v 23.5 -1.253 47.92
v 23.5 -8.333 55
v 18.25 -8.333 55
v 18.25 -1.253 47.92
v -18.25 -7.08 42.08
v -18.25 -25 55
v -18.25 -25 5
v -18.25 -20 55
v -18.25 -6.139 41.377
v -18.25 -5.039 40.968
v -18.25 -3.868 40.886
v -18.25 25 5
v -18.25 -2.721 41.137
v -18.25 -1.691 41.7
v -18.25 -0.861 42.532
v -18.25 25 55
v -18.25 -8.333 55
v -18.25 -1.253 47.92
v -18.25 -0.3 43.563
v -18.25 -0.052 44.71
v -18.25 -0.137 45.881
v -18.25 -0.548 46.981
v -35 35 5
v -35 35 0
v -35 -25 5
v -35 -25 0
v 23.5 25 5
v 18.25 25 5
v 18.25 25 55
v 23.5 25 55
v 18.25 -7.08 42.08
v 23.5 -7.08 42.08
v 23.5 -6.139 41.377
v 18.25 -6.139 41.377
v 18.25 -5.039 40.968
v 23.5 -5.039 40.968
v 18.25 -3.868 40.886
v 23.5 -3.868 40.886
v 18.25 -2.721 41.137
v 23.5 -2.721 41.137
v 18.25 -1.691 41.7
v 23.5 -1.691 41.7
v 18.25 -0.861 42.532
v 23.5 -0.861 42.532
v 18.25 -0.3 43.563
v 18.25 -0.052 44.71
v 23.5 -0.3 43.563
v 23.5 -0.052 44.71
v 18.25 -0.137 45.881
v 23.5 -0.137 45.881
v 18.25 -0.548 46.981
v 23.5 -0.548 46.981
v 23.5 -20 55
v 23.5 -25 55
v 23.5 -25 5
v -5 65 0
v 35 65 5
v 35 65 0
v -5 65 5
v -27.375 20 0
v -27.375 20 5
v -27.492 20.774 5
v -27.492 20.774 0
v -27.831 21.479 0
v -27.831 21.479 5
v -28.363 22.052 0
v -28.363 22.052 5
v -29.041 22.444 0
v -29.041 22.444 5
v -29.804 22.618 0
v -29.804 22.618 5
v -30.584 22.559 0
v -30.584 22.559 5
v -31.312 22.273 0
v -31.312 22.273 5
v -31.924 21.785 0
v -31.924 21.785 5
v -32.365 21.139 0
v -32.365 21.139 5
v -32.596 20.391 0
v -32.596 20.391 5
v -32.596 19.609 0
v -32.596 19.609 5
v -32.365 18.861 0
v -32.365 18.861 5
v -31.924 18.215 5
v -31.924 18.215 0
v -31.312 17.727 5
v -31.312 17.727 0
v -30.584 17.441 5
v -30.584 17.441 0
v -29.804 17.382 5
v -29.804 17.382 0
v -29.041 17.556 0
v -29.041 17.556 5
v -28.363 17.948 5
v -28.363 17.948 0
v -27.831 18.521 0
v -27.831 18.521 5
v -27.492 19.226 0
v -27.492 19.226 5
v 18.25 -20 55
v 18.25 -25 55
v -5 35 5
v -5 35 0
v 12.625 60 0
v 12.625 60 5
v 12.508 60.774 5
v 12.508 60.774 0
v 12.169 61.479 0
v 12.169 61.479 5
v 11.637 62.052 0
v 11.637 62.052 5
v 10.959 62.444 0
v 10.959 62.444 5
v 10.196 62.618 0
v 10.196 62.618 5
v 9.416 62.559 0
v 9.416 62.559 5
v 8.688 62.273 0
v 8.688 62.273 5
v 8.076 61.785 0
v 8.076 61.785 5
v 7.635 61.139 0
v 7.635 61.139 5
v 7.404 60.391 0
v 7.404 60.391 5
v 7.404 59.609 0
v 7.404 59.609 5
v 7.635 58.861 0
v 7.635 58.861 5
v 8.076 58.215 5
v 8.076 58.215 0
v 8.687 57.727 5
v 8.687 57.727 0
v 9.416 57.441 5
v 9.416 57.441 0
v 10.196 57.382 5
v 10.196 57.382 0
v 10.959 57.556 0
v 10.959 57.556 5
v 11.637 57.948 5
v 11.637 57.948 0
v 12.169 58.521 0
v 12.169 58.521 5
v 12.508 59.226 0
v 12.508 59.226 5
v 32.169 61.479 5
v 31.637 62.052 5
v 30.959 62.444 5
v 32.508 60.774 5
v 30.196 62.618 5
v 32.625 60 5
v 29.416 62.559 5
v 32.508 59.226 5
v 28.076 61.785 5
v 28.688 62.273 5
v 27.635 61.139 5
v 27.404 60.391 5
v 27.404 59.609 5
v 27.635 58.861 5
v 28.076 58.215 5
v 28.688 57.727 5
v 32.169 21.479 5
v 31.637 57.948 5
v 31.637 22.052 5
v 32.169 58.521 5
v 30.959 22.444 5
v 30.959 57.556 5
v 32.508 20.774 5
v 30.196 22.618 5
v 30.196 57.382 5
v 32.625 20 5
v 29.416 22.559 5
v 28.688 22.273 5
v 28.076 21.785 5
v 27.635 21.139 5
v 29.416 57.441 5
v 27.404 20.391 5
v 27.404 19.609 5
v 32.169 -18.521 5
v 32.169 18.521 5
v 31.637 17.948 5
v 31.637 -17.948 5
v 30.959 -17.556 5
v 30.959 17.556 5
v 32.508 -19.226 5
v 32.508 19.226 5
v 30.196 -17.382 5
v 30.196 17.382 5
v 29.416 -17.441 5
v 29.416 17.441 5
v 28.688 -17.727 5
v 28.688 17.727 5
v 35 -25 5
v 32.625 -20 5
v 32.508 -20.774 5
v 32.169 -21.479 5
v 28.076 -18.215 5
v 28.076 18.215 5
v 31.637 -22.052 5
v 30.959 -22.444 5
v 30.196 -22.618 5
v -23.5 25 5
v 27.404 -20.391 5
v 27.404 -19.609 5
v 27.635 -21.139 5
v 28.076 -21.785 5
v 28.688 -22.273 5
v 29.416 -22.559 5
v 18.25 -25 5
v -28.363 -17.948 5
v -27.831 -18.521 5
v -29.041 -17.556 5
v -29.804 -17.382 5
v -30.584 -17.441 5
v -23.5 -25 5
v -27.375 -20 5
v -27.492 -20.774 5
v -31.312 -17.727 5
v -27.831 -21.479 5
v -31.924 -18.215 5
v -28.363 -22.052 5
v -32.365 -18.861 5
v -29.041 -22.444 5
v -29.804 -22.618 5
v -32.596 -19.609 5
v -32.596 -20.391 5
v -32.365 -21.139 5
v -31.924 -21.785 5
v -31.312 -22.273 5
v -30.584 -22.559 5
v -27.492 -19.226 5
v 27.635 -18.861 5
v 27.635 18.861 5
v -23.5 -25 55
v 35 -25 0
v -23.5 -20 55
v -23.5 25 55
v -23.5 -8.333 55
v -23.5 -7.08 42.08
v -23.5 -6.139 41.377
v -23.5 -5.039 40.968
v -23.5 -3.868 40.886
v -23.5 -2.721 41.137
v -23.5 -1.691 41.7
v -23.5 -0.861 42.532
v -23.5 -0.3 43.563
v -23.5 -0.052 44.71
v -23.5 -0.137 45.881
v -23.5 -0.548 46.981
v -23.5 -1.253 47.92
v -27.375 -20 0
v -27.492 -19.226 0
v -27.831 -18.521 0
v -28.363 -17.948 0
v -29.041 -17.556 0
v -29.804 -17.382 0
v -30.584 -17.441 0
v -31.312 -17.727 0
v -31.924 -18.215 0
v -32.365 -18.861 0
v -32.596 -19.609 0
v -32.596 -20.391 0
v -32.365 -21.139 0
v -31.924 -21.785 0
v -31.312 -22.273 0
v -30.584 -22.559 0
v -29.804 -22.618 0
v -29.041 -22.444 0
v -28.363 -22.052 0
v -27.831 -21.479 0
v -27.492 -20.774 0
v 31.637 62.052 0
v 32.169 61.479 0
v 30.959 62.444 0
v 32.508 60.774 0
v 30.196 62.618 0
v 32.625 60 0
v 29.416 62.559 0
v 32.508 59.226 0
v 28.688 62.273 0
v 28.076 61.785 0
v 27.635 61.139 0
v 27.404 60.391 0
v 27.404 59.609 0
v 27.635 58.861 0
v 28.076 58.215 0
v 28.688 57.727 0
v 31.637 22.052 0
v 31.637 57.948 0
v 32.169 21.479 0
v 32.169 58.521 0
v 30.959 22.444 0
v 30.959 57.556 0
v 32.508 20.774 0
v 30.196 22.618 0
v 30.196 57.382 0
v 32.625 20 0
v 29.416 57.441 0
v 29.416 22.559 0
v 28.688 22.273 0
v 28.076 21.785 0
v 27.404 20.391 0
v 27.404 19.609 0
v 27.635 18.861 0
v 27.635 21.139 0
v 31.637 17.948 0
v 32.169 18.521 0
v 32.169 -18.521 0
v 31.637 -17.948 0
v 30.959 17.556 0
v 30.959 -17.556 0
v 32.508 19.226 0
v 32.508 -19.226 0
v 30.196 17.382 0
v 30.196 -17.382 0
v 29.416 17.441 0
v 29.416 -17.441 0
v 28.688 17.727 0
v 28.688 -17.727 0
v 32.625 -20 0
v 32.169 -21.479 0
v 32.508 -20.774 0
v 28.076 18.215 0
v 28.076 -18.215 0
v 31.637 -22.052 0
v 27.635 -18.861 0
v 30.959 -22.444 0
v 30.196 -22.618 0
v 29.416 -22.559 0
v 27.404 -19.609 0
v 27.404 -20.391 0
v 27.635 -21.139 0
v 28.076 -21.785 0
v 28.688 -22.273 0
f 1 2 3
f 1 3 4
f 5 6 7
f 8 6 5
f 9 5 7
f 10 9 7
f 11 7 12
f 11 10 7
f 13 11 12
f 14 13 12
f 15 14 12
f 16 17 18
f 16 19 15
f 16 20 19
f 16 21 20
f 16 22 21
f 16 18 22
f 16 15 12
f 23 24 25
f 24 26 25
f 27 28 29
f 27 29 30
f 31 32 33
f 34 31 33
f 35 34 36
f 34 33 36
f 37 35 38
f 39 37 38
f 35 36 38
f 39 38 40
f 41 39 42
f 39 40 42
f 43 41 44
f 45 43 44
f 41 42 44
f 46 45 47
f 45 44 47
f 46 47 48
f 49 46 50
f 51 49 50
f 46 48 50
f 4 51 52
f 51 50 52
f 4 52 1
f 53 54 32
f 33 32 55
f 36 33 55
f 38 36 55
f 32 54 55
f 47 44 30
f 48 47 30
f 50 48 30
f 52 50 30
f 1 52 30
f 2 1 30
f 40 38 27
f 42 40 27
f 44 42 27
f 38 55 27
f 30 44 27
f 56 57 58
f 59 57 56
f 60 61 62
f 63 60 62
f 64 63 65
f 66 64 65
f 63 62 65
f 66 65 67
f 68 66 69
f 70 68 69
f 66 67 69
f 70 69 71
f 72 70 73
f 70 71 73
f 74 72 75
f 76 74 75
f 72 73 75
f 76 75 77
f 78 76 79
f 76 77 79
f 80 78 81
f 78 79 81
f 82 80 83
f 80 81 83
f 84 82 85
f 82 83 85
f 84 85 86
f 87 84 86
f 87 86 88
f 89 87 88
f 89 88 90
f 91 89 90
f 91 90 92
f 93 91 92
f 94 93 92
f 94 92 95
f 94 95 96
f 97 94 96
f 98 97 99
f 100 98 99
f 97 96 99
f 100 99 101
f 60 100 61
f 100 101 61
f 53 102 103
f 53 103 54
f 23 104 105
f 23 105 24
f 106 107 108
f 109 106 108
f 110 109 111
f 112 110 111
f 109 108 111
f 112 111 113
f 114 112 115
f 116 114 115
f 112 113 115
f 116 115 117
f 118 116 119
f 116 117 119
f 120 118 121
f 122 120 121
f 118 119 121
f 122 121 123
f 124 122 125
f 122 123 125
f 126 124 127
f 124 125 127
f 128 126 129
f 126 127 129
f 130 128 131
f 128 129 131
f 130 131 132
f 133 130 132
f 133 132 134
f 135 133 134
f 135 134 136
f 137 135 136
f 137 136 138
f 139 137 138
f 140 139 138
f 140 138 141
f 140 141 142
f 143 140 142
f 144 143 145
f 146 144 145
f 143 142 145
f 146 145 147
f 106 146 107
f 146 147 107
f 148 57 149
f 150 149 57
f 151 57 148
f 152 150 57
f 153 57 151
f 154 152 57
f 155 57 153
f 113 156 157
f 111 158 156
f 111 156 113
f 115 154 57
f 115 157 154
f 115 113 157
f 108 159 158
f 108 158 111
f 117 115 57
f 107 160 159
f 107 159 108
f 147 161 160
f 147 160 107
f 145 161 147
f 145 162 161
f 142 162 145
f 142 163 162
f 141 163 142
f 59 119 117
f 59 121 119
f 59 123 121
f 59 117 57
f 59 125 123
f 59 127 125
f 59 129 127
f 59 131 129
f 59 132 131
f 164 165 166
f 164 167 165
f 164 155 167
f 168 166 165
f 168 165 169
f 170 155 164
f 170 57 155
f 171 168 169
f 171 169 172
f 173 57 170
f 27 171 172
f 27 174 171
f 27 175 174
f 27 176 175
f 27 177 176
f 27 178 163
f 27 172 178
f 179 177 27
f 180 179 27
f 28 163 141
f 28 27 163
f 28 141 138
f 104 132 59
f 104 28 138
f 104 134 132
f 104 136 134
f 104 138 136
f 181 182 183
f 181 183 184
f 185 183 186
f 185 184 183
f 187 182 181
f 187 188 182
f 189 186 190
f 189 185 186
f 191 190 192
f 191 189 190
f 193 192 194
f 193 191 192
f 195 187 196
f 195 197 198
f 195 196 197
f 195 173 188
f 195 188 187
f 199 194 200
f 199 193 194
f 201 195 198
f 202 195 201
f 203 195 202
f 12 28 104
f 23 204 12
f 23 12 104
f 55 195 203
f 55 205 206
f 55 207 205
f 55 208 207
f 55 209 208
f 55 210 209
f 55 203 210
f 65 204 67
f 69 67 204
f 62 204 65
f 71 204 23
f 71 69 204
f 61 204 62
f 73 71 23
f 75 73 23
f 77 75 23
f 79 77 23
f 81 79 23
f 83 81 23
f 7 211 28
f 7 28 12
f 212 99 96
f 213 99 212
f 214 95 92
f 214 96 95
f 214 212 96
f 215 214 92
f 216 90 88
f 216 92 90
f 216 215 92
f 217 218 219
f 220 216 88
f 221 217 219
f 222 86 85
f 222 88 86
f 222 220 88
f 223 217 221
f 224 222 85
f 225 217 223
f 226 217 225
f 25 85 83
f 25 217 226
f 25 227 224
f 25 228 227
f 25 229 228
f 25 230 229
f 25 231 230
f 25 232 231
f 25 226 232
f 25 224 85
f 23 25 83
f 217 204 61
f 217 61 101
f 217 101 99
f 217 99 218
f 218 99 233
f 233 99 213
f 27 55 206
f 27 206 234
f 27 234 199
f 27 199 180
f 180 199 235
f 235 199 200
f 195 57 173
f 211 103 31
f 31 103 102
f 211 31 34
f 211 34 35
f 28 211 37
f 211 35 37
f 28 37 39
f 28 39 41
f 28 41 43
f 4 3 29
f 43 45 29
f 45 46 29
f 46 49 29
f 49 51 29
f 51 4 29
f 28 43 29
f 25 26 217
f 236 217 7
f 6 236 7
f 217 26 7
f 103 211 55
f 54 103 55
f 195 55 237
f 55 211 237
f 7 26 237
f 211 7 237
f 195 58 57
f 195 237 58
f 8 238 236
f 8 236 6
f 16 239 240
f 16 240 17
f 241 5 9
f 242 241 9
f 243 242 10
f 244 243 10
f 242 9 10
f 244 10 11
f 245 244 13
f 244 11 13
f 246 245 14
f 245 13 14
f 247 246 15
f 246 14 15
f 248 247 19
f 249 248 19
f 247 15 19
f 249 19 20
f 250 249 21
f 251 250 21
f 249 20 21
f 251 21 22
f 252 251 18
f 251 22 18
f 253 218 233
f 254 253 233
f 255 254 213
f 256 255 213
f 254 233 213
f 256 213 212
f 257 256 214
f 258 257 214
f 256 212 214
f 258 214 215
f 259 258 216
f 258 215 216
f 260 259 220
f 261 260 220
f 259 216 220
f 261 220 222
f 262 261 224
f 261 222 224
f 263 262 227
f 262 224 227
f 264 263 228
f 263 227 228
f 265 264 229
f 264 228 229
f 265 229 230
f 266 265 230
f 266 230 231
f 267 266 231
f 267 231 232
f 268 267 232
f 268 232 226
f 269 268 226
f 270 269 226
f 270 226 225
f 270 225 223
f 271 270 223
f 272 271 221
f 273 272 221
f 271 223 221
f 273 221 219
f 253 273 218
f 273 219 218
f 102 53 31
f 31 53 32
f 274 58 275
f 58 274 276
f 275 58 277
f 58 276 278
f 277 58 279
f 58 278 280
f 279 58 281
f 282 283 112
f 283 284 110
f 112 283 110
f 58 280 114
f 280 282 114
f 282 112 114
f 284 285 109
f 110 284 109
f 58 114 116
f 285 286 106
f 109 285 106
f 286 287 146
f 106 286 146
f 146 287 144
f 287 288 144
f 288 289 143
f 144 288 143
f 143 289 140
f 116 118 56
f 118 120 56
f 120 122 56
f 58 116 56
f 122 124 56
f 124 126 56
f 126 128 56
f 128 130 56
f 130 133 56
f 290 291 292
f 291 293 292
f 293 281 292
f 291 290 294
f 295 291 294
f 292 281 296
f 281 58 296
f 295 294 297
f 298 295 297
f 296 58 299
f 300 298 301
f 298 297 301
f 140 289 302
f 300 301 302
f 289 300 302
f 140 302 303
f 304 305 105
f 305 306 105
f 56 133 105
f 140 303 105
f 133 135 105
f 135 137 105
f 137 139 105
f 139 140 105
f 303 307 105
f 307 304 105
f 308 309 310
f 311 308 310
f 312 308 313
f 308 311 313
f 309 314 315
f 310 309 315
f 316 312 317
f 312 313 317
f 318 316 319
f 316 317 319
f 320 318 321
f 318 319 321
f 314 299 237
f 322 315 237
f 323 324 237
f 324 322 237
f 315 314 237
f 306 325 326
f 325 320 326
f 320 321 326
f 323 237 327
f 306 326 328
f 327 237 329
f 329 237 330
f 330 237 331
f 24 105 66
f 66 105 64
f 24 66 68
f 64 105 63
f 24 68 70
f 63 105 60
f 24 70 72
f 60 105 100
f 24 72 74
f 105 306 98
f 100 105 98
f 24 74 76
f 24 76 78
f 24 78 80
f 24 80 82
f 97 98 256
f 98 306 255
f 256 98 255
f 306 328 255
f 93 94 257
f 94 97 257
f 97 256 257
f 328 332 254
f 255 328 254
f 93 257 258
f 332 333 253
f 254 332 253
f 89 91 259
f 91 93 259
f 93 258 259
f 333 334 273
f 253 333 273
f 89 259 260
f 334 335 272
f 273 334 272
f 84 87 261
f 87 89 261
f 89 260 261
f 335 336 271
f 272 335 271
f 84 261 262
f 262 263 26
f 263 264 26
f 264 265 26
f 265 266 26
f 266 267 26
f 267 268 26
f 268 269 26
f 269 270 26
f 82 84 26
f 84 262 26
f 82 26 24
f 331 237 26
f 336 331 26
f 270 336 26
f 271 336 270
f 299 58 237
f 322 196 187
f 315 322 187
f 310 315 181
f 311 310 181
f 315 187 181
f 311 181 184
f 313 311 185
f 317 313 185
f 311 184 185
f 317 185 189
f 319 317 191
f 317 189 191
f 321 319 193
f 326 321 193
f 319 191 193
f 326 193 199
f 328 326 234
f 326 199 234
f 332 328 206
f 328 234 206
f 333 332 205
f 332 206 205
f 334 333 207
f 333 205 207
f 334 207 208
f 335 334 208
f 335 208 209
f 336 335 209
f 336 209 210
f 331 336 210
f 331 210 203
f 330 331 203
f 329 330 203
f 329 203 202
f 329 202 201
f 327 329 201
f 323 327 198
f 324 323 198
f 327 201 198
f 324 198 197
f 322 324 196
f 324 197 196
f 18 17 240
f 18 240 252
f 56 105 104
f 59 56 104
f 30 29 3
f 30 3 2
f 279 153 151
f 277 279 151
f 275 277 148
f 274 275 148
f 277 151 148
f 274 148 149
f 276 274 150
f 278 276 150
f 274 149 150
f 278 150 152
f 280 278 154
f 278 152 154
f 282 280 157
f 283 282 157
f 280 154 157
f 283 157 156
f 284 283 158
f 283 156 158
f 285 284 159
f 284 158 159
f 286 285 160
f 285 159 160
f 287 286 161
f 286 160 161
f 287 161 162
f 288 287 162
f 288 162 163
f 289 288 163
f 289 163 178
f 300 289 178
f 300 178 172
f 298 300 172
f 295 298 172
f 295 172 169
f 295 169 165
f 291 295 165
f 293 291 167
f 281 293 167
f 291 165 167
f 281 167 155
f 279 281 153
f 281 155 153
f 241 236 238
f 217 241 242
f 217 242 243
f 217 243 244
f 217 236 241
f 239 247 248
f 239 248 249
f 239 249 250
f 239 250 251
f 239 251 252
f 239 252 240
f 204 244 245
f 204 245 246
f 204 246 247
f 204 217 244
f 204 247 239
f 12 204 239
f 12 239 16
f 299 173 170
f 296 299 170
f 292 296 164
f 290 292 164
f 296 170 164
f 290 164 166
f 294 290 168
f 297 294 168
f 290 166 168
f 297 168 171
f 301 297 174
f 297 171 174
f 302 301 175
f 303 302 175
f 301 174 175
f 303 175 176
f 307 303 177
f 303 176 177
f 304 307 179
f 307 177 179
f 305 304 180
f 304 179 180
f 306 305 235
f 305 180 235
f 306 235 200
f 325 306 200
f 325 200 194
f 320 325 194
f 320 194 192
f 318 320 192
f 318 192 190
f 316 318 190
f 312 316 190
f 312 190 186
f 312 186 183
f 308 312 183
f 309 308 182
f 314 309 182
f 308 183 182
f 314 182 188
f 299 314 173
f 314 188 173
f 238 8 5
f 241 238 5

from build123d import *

# Parameters (mm, degrees)
SKETCH_W        = 70
SKETCH_H        = 50
PAD_DEPTH       = 5
SKETCH001_R     = 2.625
POCKET_DEPTH    = 5
SKETCH002_W     = 47
SKETCH002_H     = 50
PAD001_DEPTH    = 50
SKETCH003_W     = 36.5
SKETCH003_H     = 50
POCKET001_DEPTH = 50
POCKET002_DEPTH = 40
POCKET003_DEPTH = 50
SKETCH005_W     = 40
SKETCH005_H     = 5
PAD002_DEPTH    = 40
SKETCH006_R     = 2.625
POCKET004_DEPTH = 5
SKETCH007_W     = 30
SKETCH007_H     = 5
PAD003_DEPTH    = 10


with BuildPart() as part:
    # Sketch → Pad (new body)
    with BuildSketch(Plane.XY):
        Rectangle(SKETCH_W, SKETCH_H)
    extrude(amount=PAD_DEPTH)

    # Sketch001 (on Face6 of Pad) → Pocket (cut)
    with BuildSketch(Plane.XY.offset(5)):
        with Locations((-30, 20)):
            Circle(SKETCH001_R)
        with Locations((30, 20)):
            Circle(SKETCH001_R)
        with Locations((30, -20)):
            Circle(SKETCH001_R)
        with Locations((-30, -20)):
            Circle(SKETCH001_R)
    extrude(amount=-POCKET_DEPTH, mode=Mode.SUBTRACT)

    # Sketch002 (on Face5 of Pocket) → Pad001 (join)
    with BuildSketch(Plane.XY.offset(5)):
        Rectangle(SKETCH002_W, SKETCH002_H)
    extrude(amount=PAD001_DEPTH)

    # Sketch003 (on Face16 of Pad001) → Pocket001 (cut)
    with BuildSketch(Plane.XY.offset(55)):
        Rectangle(SKETCH003_W, SKETCH003_H)
    extrude(amount=-POCKET001_DEPTH, mode=Mode.SUBTRACT)

    # Sketch004 (on Face18 of Pocket001) → Pocket002 (cut)
    with BuildSketch(Plane.YZ.offset(23.5)):
        with BuildLine():
            Line((-8.332745, 55), (-1.252745, 47.92))
            ThreePointArc((-7.08, 42.08), (-1.246373, 42.086373), (-1.252745, 47.92))
            Line((-20, 55), (-7.08, 42.08))
            Line((-20, 55), (-8.332745, 55))
        make_face()
    extrude(amount=-POCKET002_DEPTH, mode=Mode.SUBTRACT)

    # Sketch004 (on Face18 of Pocket001) → Pocket003 (cut)
    with BuildSketch(Plane.YZ.offset(23.5)):
        with BuildLine():
            Line((-8.332745, 55), (-1.252745, 47.92))
            ThreePointArc((-7.08, 42.08), (-1.246373, 42.086373), (-1.252745, 47.92))
            Line((-20, 55), (-7.08, 42.08))
            Line((-20, 55), (-8.332745, 55))
        make_face()
    extrude(amount=-POCKET003_DEPTH, mode=Mode.SUBTRACT)

    # Sketch005 (on Face3 of Pocket003) → Pad002 (join)
    with BuildSketch(Plane(origin=(0, 25, 0), x_dir=(-1, 0, 0), z_dir=(0, 1, 0))):
        with Locations((-15, 2.5)):
            Rectangle(SKETCH005_W, SKETCH005_H)
    extrude(amount=PAD002_DEPTH)

    # Sketch006 (on Face21 of Pad002) → Pocket004 (cut)
    with BuildSketch(Plane.XY.offset(5)):
        with Locations((30, 60)):
            Circle(SKETCH006_R)
        with Locations((10, 60)):
            Circle(SKETCH006_R)
    extrude(amount=-POCKET004_DEPTH, mode=Mode.SUBTRACT)

    # Sketch007 (on Face3 of Pocket004) → Pad003 (join)
    with BuildSketch(Plane(origin=(0, 25, 0), x_dir=(-1, 0, 0), z_dir=(0, 1, 0))):
        with Locations((20, 2.5)):
            Rectangle(SKETCH007_W, SKETCH007_H)
    extrude(amount=PAD003_DEPTH)


solid = part.part
